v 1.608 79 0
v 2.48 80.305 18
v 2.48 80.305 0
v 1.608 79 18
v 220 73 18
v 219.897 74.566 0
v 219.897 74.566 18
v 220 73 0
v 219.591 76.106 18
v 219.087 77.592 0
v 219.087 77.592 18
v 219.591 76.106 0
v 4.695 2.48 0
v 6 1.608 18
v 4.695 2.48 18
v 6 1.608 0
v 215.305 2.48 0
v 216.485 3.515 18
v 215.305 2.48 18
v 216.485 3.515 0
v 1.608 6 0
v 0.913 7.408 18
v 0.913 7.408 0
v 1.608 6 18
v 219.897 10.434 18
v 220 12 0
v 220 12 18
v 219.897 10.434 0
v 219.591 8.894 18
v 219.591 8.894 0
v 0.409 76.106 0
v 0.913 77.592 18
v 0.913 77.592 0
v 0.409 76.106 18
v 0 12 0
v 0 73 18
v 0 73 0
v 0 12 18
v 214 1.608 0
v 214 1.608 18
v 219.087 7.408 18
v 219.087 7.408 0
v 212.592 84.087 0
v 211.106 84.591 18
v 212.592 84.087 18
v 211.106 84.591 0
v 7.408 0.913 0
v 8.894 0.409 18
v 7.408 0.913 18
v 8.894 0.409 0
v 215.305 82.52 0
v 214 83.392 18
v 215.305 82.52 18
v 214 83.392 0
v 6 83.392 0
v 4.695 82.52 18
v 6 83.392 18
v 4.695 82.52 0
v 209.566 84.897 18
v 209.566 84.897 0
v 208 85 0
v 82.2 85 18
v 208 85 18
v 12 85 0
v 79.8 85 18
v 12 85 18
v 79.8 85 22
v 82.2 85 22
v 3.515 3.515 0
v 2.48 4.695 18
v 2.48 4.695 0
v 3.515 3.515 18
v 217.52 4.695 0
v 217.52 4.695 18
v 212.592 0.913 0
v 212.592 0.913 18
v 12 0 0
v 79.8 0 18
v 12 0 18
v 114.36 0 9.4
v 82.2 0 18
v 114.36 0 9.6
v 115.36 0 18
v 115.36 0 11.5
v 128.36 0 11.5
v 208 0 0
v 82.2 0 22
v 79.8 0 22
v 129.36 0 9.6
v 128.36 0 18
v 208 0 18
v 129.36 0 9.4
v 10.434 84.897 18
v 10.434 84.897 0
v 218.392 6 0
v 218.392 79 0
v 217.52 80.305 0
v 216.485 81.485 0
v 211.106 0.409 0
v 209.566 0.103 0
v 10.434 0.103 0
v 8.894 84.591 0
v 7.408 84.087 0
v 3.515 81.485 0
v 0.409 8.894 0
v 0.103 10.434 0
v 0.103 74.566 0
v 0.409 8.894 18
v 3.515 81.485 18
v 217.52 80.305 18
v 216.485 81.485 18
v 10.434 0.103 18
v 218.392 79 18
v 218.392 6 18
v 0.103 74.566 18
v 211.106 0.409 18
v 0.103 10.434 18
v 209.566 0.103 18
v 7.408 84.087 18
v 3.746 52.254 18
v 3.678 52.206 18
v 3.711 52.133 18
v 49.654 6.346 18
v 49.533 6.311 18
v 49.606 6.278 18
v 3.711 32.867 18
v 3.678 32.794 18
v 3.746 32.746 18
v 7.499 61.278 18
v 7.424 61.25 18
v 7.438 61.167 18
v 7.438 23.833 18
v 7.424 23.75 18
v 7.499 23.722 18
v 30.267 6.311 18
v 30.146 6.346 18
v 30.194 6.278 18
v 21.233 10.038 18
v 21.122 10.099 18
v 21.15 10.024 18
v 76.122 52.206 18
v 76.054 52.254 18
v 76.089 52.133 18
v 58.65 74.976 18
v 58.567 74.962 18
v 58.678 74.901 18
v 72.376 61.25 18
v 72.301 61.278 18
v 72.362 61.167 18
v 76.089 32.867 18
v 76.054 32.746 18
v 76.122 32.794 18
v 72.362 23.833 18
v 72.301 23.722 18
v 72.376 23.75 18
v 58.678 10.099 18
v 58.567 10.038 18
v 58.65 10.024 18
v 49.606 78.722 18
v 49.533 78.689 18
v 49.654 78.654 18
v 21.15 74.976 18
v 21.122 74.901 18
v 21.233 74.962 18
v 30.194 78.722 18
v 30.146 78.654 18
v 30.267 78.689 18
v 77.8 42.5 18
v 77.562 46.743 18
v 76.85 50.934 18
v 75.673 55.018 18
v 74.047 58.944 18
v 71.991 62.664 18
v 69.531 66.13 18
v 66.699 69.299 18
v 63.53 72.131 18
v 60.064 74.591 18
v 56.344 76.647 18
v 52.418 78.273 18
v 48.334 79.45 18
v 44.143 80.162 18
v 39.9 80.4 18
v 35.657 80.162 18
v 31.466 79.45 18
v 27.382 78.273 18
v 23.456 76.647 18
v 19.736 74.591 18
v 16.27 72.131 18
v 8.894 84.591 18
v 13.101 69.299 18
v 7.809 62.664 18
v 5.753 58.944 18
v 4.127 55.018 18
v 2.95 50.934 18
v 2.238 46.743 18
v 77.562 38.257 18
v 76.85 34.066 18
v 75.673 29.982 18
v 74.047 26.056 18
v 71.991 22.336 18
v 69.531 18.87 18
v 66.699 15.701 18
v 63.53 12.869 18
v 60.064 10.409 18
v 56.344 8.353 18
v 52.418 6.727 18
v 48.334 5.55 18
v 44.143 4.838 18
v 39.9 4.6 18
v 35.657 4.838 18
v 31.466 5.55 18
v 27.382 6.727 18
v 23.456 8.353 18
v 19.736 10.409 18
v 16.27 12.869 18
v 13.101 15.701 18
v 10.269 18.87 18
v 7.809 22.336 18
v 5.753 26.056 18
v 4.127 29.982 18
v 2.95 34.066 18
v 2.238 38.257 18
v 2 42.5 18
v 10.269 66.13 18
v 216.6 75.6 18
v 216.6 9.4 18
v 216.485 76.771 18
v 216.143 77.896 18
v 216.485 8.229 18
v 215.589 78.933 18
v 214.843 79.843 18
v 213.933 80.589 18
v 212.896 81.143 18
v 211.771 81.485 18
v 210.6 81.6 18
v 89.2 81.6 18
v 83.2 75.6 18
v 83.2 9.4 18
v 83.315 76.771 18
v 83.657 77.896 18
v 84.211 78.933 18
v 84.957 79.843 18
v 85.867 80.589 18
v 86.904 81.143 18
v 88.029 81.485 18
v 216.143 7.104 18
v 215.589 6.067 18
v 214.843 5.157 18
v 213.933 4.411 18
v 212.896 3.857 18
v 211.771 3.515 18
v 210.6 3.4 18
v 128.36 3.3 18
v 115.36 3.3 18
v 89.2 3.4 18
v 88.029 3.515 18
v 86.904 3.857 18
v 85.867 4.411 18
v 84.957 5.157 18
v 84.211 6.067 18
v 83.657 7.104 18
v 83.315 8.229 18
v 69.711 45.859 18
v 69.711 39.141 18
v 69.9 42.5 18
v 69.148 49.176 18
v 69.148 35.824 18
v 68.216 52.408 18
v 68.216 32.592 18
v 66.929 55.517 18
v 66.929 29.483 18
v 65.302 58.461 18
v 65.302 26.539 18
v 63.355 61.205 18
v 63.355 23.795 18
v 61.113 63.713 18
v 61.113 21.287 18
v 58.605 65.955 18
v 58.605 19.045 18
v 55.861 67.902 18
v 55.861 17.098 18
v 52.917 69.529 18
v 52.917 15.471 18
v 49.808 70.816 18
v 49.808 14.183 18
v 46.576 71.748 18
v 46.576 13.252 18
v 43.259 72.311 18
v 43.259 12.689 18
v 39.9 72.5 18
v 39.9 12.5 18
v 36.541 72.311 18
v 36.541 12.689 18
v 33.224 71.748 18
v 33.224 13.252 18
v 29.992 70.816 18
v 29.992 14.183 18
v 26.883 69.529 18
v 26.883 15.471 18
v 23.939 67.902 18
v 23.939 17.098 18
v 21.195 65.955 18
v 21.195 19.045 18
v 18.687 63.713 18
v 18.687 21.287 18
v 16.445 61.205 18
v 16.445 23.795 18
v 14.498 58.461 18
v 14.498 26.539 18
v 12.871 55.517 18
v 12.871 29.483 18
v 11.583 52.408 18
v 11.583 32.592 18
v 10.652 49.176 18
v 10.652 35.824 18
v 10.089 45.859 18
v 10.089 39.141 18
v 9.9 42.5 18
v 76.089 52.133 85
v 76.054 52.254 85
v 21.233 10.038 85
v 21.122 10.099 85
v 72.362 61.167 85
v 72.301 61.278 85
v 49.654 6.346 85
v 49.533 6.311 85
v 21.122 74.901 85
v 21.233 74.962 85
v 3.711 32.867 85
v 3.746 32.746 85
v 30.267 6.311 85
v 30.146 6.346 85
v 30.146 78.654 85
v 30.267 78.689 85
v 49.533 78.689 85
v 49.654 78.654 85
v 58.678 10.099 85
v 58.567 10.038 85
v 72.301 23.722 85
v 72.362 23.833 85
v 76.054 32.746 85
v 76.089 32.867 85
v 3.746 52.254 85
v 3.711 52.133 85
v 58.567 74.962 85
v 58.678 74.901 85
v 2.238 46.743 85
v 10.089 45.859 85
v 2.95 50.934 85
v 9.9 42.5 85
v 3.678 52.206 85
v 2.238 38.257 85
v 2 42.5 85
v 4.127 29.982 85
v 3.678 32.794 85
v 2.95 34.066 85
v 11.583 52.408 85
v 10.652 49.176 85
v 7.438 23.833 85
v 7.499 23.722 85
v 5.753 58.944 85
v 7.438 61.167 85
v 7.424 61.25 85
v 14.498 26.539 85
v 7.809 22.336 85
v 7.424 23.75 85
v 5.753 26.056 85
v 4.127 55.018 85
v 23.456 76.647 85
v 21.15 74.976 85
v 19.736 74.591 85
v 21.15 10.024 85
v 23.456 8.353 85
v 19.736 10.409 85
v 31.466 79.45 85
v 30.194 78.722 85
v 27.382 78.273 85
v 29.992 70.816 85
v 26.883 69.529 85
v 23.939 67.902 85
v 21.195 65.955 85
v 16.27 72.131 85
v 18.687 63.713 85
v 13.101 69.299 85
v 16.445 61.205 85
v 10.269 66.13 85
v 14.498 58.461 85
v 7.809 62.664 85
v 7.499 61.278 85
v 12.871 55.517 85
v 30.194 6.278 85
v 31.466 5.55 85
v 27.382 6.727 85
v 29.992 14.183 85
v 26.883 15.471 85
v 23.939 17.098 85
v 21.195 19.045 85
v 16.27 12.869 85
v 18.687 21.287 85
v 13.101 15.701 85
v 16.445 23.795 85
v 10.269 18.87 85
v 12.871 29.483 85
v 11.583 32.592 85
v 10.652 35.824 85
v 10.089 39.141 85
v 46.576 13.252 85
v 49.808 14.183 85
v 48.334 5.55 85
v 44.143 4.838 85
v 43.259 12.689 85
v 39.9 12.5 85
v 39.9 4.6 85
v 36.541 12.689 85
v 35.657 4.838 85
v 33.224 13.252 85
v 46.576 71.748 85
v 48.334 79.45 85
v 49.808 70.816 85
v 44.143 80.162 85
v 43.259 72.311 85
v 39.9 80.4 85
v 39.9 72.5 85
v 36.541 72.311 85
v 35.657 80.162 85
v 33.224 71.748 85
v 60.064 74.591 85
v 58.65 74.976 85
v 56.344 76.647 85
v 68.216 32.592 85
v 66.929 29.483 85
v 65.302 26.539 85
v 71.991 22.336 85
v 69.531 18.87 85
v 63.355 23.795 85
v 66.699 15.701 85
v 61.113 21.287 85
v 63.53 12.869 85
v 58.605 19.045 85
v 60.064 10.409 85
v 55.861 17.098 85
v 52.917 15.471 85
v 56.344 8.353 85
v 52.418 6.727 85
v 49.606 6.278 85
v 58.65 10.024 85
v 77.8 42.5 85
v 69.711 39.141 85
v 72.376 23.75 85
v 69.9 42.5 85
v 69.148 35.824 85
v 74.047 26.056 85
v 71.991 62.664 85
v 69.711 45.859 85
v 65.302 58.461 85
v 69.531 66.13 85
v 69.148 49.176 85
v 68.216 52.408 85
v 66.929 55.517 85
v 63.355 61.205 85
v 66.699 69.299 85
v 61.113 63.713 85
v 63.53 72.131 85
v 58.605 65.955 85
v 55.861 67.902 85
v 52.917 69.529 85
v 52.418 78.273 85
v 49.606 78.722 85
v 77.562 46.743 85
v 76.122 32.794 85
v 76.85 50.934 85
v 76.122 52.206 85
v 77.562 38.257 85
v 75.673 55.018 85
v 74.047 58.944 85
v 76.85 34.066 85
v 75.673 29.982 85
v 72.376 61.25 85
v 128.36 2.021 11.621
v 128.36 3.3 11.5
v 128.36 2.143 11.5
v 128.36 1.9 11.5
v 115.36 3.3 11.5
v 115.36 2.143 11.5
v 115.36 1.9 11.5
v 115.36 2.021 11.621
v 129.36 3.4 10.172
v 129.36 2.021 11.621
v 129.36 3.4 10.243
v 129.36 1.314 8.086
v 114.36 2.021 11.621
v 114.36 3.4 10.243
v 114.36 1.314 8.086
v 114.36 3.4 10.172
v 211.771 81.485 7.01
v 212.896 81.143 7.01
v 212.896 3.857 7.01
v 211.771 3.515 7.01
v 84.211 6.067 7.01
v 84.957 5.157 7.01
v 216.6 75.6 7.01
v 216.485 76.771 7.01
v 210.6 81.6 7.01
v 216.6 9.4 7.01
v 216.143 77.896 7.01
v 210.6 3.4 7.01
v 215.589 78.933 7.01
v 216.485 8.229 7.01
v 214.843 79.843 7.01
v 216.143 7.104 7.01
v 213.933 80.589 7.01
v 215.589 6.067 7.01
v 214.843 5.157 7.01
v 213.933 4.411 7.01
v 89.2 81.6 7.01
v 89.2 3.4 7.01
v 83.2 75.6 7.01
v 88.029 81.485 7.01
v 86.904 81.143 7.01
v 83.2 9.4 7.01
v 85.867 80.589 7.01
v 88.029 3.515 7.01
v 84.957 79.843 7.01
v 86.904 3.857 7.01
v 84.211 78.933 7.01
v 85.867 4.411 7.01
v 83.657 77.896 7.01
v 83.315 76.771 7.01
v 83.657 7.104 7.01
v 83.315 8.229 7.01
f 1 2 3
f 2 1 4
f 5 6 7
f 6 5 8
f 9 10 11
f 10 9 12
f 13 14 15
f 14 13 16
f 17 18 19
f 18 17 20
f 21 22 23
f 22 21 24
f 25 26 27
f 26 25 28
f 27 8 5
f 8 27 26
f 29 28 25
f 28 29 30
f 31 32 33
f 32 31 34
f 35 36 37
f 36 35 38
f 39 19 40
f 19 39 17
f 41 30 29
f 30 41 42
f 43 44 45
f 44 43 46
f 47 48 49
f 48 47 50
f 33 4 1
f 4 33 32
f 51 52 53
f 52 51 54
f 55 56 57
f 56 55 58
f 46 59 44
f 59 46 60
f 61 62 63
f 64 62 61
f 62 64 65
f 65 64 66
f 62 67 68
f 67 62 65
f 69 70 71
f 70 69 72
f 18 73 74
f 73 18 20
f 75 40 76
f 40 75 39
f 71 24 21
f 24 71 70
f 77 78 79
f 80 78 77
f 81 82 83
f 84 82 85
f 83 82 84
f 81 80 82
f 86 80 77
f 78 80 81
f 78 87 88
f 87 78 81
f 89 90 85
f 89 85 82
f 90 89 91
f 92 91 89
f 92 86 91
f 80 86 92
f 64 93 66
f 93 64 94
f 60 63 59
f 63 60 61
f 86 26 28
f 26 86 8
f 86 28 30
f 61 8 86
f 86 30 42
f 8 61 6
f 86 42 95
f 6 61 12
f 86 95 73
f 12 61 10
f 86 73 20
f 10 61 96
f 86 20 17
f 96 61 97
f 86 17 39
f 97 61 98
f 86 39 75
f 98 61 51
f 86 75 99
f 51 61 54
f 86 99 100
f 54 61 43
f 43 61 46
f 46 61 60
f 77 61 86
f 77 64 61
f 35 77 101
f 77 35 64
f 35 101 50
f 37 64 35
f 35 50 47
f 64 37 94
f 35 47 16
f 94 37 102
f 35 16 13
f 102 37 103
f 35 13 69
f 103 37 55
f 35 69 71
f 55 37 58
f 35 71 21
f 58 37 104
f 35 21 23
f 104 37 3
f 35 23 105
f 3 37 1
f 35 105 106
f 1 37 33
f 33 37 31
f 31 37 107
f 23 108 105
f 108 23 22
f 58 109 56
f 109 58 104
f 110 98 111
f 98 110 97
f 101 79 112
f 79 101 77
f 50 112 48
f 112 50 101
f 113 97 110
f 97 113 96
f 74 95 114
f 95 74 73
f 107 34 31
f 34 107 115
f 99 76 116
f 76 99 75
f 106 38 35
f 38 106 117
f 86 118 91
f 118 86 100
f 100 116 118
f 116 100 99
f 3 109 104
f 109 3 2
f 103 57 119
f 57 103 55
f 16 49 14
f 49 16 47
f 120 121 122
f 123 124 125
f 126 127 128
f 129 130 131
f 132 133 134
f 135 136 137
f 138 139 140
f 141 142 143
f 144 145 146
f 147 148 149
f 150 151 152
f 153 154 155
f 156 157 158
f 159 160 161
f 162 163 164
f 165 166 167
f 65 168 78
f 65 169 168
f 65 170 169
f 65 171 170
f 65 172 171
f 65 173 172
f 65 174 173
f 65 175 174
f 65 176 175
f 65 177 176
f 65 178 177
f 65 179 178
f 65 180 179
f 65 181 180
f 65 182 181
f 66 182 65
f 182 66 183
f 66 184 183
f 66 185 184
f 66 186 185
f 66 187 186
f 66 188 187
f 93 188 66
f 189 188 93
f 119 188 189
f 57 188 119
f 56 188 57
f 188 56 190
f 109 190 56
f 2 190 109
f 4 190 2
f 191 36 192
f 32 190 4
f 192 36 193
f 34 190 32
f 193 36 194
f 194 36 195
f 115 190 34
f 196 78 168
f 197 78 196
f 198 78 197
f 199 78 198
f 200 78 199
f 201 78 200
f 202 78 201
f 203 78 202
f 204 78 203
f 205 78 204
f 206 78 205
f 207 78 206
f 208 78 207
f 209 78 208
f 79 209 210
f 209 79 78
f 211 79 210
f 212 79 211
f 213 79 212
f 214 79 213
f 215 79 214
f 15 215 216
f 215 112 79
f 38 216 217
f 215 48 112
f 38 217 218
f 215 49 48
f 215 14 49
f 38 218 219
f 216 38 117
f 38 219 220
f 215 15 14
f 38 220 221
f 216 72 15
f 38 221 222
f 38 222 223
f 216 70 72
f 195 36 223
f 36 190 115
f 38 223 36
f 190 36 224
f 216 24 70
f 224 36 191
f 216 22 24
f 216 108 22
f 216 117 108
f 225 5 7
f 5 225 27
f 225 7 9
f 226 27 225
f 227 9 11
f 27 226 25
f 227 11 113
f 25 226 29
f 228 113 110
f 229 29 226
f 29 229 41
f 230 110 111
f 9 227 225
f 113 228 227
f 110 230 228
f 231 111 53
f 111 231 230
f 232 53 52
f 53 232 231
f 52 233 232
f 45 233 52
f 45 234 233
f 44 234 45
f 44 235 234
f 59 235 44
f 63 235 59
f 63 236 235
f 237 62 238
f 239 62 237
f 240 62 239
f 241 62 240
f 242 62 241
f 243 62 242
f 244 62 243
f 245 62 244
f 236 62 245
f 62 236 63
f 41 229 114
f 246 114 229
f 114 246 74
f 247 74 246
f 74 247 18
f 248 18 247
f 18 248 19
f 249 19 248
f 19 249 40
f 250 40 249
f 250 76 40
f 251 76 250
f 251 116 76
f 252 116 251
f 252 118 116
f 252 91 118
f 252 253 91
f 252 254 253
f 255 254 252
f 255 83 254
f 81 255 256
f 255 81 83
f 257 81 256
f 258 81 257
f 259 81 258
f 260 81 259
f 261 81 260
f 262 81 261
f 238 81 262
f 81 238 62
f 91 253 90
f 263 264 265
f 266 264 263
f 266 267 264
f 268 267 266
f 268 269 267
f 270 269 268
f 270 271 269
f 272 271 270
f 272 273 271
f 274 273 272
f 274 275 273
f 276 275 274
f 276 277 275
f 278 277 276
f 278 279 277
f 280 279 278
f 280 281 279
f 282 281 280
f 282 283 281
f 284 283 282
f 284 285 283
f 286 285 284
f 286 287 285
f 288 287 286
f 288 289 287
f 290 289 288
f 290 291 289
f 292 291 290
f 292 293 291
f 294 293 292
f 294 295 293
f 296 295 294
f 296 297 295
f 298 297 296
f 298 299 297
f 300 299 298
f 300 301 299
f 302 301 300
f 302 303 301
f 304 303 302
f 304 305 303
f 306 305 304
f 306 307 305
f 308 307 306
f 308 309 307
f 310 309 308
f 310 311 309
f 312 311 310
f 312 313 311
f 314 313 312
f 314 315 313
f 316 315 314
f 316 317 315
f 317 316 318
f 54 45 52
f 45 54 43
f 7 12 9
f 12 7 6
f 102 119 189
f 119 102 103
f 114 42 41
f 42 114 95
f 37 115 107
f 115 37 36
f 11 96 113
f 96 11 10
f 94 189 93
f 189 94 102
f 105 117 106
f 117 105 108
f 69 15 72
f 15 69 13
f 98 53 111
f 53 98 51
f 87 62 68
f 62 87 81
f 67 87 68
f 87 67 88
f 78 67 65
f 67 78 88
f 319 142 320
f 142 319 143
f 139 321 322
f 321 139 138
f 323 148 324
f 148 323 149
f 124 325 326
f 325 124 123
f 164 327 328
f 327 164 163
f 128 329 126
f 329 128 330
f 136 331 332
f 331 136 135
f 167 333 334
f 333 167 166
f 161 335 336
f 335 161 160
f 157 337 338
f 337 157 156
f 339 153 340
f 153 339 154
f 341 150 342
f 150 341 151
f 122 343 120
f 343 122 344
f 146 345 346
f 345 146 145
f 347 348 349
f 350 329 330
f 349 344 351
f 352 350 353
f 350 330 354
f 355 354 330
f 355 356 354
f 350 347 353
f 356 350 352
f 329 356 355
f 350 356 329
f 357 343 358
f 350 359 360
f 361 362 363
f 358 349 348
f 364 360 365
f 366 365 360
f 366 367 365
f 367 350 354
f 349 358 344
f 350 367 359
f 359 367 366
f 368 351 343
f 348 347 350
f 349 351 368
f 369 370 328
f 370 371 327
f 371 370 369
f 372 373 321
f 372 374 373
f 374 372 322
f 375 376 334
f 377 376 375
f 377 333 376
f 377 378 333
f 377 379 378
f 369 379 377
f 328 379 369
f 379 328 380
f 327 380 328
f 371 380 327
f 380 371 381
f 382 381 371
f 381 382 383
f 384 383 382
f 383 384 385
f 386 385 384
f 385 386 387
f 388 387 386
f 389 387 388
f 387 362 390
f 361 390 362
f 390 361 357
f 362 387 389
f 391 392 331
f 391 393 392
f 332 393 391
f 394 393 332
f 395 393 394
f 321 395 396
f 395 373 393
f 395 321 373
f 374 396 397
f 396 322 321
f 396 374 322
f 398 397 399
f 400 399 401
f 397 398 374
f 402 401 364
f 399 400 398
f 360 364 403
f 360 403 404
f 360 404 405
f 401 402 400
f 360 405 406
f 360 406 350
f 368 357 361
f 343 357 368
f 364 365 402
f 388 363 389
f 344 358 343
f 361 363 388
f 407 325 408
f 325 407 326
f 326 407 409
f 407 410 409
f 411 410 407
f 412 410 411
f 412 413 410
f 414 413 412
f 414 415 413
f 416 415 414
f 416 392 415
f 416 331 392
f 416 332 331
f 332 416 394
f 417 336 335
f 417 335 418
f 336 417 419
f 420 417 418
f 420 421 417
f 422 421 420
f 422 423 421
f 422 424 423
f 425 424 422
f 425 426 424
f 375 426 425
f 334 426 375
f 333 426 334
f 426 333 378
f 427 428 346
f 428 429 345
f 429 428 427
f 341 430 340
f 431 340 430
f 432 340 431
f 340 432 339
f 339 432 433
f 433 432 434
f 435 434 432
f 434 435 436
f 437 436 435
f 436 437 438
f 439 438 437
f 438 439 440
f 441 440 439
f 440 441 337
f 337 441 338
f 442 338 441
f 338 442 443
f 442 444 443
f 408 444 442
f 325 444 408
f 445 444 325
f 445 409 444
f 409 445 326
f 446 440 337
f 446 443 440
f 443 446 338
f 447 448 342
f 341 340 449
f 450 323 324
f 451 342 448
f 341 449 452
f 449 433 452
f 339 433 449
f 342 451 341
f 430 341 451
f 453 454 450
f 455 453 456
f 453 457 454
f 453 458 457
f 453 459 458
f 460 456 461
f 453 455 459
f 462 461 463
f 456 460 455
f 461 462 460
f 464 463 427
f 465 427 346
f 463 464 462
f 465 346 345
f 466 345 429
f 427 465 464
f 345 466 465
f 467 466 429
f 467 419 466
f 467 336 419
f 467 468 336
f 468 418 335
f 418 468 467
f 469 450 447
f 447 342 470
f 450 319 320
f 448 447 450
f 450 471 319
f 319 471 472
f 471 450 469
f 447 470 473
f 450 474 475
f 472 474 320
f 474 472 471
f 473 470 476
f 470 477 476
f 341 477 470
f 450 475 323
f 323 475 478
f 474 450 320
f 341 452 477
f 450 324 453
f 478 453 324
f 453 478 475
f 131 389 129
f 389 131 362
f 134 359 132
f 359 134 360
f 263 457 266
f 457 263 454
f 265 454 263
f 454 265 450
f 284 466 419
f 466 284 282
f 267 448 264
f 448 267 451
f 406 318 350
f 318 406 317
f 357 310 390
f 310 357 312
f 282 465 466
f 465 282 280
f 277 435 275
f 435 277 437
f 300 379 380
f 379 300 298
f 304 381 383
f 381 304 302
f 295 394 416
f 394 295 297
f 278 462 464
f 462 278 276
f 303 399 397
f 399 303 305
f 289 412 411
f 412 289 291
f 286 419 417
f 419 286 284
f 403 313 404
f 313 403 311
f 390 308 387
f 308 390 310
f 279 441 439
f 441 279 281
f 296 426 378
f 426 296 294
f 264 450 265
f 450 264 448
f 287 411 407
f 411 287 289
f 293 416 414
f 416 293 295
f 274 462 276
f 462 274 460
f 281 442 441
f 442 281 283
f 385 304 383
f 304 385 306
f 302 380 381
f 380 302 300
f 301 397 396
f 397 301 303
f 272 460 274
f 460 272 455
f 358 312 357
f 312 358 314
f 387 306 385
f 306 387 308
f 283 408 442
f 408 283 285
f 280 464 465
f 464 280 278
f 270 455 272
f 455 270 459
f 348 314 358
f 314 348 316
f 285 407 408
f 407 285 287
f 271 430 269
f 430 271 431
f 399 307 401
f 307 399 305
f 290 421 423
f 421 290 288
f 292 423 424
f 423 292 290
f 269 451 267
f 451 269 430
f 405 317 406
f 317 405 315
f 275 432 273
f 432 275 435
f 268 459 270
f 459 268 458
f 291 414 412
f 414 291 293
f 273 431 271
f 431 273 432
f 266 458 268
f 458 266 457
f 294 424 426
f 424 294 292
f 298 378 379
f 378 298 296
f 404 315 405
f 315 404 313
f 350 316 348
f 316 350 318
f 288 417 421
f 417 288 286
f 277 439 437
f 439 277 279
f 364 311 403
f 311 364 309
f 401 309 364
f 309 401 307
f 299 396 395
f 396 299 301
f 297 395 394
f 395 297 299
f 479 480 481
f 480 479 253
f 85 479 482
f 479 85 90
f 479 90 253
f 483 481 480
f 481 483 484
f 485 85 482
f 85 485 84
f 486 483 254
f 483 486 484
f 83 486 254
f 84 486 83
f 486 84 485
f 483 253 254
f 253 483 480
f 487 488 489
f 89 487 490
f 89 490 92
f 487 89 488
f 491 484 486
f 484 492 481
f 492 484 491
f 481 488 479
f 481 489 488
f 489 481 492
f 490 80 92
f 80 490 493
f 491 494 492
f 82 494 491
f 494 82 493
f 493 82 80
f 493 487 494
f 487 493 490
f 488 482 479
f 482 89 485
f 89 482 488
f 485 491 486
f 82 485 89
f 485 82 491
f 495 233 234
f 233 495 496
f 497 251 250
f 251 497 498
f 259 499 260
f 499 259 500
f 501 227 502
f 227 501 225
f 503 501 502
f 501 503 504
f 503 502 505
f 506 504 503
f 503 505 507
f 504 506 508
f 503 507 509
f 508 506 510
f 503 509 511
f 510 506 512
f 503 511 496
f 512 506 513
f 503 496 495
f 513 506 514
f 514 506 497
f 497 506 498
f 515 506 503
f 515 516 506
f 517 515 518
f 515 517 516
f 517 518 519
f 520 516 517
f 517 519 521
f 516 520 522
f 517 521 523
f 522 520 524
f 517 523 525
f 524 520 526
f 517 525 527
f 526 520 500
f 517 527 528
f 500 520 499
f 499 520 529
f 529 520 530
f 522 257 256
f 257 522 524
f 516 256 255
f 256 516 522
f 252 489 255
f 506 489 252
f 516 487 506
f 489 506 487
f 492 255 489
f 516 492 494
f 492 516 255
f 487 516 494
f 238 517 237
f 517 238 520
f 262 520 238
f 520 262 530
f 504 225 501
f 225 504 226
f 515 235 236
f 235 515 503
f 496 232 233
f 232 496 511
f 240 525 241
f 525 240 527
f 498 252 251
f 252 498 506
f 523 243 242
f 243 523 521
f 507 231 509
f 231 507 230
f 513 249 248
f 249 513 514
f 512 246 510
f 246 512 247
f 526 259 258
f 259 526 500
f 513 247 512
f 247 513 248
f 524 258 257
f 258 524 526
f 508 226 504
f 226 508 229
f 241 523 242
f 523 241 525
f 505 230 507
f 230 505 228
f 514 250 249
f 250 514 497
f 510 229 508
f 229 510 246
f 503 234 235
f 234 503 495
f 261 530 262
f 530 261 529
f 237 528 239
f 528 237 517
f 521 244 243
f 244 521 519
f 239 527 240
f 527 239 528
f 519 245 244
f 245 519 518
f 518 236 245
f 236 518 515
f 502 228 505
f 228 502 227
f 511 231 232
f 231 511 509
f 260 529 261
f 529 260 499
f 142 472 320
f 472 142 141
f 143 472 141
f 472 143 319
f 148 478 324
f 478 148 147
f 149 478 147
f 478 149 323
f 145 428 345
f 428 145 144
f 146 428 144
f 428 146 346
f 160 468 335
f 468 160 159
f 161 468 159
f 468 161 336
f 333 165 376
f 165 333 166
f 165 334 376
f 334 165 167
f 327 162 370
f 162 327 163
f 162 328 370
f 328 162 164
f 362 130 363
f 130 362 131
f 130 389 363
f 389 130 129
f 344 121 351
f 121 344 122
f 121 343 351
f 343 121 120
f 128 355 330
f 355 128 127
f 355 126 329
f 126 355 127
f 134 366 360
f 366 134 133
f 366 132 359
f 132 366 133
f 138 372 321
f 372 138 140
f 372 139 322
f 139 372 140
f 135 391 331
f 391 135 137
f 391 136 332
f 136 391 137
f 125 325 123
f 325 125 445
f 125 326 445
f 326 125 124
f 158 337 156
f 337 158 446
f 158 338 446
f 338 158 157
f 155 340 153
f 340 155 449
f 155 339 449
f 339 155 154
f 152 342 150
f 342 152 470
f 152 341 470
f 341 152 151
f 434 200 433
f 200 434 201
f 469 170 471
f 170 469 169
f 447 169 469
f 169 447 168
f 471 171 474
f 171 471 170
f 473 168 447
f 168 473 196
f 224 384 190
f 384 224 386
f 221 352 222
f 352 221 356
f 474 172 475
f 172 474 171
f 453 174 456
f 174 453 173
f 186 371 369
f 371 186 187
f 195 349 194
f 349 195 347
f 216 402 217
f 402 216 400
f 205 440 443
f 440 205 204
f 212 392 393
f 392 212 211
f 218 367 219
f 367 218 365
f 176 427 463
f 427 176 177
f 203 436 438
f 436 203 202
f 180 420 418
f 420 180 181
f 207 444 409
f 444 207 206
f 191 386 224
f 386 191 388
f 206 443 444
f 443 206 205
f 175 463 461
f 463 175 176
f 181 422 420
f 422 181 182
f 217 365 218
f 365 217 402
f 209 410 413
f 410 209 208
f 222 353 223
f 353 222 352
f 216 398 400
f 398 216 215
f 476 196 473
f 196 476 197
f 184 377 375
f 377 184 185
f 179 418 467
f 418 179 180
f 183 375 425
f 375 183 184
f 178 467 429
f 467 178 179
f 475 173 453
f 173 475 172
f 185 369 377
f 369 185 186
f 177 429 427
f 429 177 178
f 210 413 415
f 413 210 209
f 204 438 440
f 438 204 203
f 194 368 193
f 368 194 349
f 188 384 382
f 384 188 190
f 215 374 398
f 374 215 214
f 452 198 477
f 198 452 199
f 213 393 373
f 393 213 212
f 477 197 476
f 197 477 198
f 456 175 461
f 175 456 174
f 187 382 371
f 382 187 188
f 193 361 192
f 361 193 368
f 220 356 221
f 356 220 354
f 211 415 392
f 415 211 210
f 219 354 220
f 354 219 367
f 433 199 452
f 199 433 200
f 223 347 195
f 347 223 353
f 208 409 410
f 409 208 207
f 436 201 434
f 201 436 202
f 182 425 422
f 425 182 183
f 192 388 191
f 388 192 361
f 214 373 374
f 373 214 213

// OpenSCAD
// ============================================================
//  ORGANIZADOR DE MESA MINIMALISTA - FDM 3D Print Ready
//  Para alterar medidas, edite os parâmetros abaixo.
//  Principais: total_length, total_width, tray_height,
//              cup_height, cup_od, cup_id, corner_r
// ============================================================

$fn = 56;

// --- Parâmetros Principais ---
total_length  = 220;   // comprimento total da base
total_width   = 85;    // largura total da base
tray_height   = 18;    // altura da base/bandeja
corner_r      = 12;    // raio dos cantos arredondados

// --- Copo porta-controle ---
cup_height    = 85;    // altura total do copo
cup_od        = 75;    // diâmetro externo
cup_id        = 60;    // diâmetro interno
cup_wall      = (cup_od - cup_id) / 2; // ~7.5 mm

// --- Bandeja ---
tray_inner_depth = 11; // profundidade útil da bandeja
tray_wall        = 2.4;

// --- Textura canelada ---
rib_count     = 24;    // número de caneluras no copo
rib_depth     = 0.8;   // profundidade de cada canelura
rib_width     = 1.2;   // largura do sulco
tray_rib_count = 18;   // caneluras na lateral da bandeja

// --- Suporte de celular ---
phone_slot_w  = 13;    // largura da canaleta
phone_slot_d  = 6.5;   // profundidade
phone_slot_h  = tray_height + 1;

// --- Área de moedas ---
coin_r        = 18;    // raio da área circular de moedas
coin_depth    = 2.5;   // rebaixo

// --- Divisória interna da bandeja ---
divider_t     = 1.8;   // espessura

// --- Posicionamento ---
cup_cx = cup_od / 2 + tray_wall;           // centro X do copo
tray_x_start = cup_od + tray_wall * 2;     // onde a bandeja começa em X
tray_length  = total_length - tray_x_start; // comprimento da bandeja

// ============================================================
//  MÓDULO: caixa com cantos arredondados (extrusão Minkowski)
// ============================================================
module rounded_box(length, width, height, radius) {
    r = min(radius, min(length, width) / 2 - 0.1);
    minkowski() {
        cube([length - r*2, width - r*2, height * 0.01], center = false);
        union() {
            cylinder(r = r, h = height - 1, $fn = 48);
        }
    }
}

// ============================================================
//  MÓDULO: textura canelada vertical (sulcos em torno de cil.)
// ============================================================
module ribbed_texture_cup(radius, height, count, depth, width) {
    angle_step = 360 / count;
    for (i = [0 : count - 1]) {
        rotate([0, 0, i * angle_step])
        translate([radius - depth / 2, 0, 0])
        scale([depth, width, 1])
        cylinder(r = 0.5, h = height, $fn = 8);
    }
}

module ribbed_texture_tray(length, height, count, depth, width) {
    step = length / count;
    for (i = [0 : count - 1]) {
        translate([i * step + step / 2, -depth / 2, 0])
        scale([width, depth, 1])
        cylinder(r = 0.5, h = height, $fn = 8);
    }
}

// ============================================================
//  MÓDULO: base/bandeja direita
// ============================================================
module tray_base() {
    // --- Bloco base completo com cantos arredondados ---
    translate([corner_r, corner_r, 0])
    minkowski() {
        cube([total_length - corner_r*2, total_width - corner_r*2, tray_height * 0.5]);
        cylinder(r = corner_r, h = tray_height * 0.5, $fn = 48);
    }

    // --- Parede traseira da bandeja (reforço) ---
    bx = tray_x_start;
    translate([bx, 0, 0])
    cube([tray_wall, total_width, tray_height + 4]);
}

// ============================================================
//  MÓDULO: interior escavado da bandeja
// ============================================================
module tray_interior() {
    bx = tray_x_start + tray_wall;
    inner_l = tray_length - tray_wall * 2 - 2;
    inner_w = total_width - tray_wall * 2 - 2;
    inner_h = tray_inner_depth;

    translate([bx + 1, tray_wall + 1, tray_height - inner_h + 0.01])
    hull() {
        r2 = 6;
        pts = [[r2, r2], [inner_l - r2, r2],
               [inner_l - r2, inner_w - r2], [r2, inner_w - r2]];
        for (p = pts)
            translate([p[0], p[1], 0])
            cylinder(r = r2, h = inner_h + 1, $fn = 32);
    }
}

// ============================================================
//  MÓDULO: divisória interna da bandeja
// ============================================================
module tray_divider() {
    bx   = tray_x_start + tray_wall + 1;
    div_x = bx + (tray_length - tray_wall * 2 - 2) * 0.45;
    div_h = tray_inner_depth - 1;
    div_w = total_width - tray_wall * 2 - 4;

    translate([div_x, tray_wall + 2, tray_height - tray_inner_depth + 0.5])
    hull() {
        cube([divider_t, div_w, div_h * 0.6]);
        translate([0, 4, div_h * 0.6])
        cube([divider_t, div_w - 8, 0.1]);
    }
}

// ============================================================
//  MÓDULO: área circular para moedas/anel
// ============================================================
module coin_area() {
    bx     = tray_x_start + tray_wall + 1;
    inner_w = total_width - tray_wall * 2 - 2;
    cx     = bx + (tray_length - tray_wall * 2 - 2) * 0.75;
    cy     = tray_wall + 1 + inner_w / 2;
    cz     = tray_height - coin_depth + 0.01;

    translate([cx, cy, cz])
    cylinder(r = coin_r, h = coin_depth + 1, $fn = 48);
}

// ============================================================
//  MÓDULO: copo porta-controle/canetas
// ============================================================
module remote_cup() {
    cx = cup_cx;
    cy = total_width / 2;

    difference() {
        // Corpo externo
        translate([cx, cy, 0])
        cylinder(d = cup_od, h = cup_height, $fn = 56);

        // Furo interno
        translate([cx, cy, tray_wall + 1])
        cylinder(d = cup_id, h = cup_height, $fn = 56);

        // Cortar base para encaixar na bandeja
        translate([0, 0, -0.1])
        cube([tray_x_start + 0.1, total_width, tray_height]);
    }
}

// ============================================================
//  MÓDULO: textura ripada no copo
// ============================================================
module cup_ribs() {
    cx = cup_cx;
    cy = total_width / 2;
    r  = cup_od / 2;

    translate([cx, cy, tray_height])
    difference() {
        cylinder(r = r + rib_depth * 0.5, h = cup_height - tray_height, $fn = 56);
        cylinder(r = r - rib_depth * 0.5, h = cup_height - tray_height + 1, $fn = 56);
        ribbed_texture_cup(r, cup_height - tray_height, rib_count, rib_depth * 6, rib_width * 2);
    }
}

// ============================================================
//  MÓDULO: textura ripada na lateral externa da bandeja
// ============================================================
module tray_ribs() {
    side_h = tray_height;
    bx     = tray_x_start;
    len    = tray_length;

    // Lateral frontal
    translate([bx, 0, 0])
    difference() {
        cube([len, tray_wall, side_h]);
        translate([0, tray_wall, 0])
        ribbed_texture_tray(len, side_h, tray_rib_count, rib_depth * 5, rib_width * 1.5);
    }

    // Lateral traseira
    translate([bx, total_width - tray_wall, 0])
    difference() {
        cube([len, tray_wall, side_h]);
        ribbed_texture_tray(len, side_h, tray_rib_count, rib_depth * 5, rib_width * 1.5);
    }
}

// ============================================================
//  MÓDULO: suporte frontal de celular
// ============================================================
module phone_slot() {
    slot_y = total_width / 2 - phone_slot_w / 2;
    slot_x = tray_x_start + (tray_length) * 0.3;

    // Corta a parede frontal da base para criar a canaleta
    translate([slot_x - phone_slot_w / 2, -0.1, tray_height - phone_slot_d])
    cube([phone_slot_w, tray_wall + 1, phone_slot_d + 1]);

    // Chanfro suave na entrada
    translate([slot_x - phone_slot_w / 2 - 1, -0.1, tray_height - phone_slot_d - 2])
    rotate([-45, 0, 0])
    cube([phone_slot_w + 2, 2, 3]);
}

// ============================================================
//  MÓDULO: produto final
// ============================================================
module final_product() {
    difference() {
        union() {
            // Base com bandeja
            tray_base();

            // Copo
            remote_cup();

            // Divisória
            tray_divider();
        }

        // Escavar interior da bandeja
        tray_interior();

        // Escavar área de moedas
        coin_area();

        // Slot do celular
        phone_slot();
    }

    // Textura ripada (subtractiva no copo)
    difference() {
        cup_ribs();
        // Garantir que não ultrapasse o interior do copo
        translate([cup_cx, total_width / 2, -0.1])
        cylinder(d = cup_id - 1, h = cup_height + 1, $fn = 56);
    }
}

// ============================================================
//  CHAMADA PRINCIPAL
// ============================================================
final_product();
